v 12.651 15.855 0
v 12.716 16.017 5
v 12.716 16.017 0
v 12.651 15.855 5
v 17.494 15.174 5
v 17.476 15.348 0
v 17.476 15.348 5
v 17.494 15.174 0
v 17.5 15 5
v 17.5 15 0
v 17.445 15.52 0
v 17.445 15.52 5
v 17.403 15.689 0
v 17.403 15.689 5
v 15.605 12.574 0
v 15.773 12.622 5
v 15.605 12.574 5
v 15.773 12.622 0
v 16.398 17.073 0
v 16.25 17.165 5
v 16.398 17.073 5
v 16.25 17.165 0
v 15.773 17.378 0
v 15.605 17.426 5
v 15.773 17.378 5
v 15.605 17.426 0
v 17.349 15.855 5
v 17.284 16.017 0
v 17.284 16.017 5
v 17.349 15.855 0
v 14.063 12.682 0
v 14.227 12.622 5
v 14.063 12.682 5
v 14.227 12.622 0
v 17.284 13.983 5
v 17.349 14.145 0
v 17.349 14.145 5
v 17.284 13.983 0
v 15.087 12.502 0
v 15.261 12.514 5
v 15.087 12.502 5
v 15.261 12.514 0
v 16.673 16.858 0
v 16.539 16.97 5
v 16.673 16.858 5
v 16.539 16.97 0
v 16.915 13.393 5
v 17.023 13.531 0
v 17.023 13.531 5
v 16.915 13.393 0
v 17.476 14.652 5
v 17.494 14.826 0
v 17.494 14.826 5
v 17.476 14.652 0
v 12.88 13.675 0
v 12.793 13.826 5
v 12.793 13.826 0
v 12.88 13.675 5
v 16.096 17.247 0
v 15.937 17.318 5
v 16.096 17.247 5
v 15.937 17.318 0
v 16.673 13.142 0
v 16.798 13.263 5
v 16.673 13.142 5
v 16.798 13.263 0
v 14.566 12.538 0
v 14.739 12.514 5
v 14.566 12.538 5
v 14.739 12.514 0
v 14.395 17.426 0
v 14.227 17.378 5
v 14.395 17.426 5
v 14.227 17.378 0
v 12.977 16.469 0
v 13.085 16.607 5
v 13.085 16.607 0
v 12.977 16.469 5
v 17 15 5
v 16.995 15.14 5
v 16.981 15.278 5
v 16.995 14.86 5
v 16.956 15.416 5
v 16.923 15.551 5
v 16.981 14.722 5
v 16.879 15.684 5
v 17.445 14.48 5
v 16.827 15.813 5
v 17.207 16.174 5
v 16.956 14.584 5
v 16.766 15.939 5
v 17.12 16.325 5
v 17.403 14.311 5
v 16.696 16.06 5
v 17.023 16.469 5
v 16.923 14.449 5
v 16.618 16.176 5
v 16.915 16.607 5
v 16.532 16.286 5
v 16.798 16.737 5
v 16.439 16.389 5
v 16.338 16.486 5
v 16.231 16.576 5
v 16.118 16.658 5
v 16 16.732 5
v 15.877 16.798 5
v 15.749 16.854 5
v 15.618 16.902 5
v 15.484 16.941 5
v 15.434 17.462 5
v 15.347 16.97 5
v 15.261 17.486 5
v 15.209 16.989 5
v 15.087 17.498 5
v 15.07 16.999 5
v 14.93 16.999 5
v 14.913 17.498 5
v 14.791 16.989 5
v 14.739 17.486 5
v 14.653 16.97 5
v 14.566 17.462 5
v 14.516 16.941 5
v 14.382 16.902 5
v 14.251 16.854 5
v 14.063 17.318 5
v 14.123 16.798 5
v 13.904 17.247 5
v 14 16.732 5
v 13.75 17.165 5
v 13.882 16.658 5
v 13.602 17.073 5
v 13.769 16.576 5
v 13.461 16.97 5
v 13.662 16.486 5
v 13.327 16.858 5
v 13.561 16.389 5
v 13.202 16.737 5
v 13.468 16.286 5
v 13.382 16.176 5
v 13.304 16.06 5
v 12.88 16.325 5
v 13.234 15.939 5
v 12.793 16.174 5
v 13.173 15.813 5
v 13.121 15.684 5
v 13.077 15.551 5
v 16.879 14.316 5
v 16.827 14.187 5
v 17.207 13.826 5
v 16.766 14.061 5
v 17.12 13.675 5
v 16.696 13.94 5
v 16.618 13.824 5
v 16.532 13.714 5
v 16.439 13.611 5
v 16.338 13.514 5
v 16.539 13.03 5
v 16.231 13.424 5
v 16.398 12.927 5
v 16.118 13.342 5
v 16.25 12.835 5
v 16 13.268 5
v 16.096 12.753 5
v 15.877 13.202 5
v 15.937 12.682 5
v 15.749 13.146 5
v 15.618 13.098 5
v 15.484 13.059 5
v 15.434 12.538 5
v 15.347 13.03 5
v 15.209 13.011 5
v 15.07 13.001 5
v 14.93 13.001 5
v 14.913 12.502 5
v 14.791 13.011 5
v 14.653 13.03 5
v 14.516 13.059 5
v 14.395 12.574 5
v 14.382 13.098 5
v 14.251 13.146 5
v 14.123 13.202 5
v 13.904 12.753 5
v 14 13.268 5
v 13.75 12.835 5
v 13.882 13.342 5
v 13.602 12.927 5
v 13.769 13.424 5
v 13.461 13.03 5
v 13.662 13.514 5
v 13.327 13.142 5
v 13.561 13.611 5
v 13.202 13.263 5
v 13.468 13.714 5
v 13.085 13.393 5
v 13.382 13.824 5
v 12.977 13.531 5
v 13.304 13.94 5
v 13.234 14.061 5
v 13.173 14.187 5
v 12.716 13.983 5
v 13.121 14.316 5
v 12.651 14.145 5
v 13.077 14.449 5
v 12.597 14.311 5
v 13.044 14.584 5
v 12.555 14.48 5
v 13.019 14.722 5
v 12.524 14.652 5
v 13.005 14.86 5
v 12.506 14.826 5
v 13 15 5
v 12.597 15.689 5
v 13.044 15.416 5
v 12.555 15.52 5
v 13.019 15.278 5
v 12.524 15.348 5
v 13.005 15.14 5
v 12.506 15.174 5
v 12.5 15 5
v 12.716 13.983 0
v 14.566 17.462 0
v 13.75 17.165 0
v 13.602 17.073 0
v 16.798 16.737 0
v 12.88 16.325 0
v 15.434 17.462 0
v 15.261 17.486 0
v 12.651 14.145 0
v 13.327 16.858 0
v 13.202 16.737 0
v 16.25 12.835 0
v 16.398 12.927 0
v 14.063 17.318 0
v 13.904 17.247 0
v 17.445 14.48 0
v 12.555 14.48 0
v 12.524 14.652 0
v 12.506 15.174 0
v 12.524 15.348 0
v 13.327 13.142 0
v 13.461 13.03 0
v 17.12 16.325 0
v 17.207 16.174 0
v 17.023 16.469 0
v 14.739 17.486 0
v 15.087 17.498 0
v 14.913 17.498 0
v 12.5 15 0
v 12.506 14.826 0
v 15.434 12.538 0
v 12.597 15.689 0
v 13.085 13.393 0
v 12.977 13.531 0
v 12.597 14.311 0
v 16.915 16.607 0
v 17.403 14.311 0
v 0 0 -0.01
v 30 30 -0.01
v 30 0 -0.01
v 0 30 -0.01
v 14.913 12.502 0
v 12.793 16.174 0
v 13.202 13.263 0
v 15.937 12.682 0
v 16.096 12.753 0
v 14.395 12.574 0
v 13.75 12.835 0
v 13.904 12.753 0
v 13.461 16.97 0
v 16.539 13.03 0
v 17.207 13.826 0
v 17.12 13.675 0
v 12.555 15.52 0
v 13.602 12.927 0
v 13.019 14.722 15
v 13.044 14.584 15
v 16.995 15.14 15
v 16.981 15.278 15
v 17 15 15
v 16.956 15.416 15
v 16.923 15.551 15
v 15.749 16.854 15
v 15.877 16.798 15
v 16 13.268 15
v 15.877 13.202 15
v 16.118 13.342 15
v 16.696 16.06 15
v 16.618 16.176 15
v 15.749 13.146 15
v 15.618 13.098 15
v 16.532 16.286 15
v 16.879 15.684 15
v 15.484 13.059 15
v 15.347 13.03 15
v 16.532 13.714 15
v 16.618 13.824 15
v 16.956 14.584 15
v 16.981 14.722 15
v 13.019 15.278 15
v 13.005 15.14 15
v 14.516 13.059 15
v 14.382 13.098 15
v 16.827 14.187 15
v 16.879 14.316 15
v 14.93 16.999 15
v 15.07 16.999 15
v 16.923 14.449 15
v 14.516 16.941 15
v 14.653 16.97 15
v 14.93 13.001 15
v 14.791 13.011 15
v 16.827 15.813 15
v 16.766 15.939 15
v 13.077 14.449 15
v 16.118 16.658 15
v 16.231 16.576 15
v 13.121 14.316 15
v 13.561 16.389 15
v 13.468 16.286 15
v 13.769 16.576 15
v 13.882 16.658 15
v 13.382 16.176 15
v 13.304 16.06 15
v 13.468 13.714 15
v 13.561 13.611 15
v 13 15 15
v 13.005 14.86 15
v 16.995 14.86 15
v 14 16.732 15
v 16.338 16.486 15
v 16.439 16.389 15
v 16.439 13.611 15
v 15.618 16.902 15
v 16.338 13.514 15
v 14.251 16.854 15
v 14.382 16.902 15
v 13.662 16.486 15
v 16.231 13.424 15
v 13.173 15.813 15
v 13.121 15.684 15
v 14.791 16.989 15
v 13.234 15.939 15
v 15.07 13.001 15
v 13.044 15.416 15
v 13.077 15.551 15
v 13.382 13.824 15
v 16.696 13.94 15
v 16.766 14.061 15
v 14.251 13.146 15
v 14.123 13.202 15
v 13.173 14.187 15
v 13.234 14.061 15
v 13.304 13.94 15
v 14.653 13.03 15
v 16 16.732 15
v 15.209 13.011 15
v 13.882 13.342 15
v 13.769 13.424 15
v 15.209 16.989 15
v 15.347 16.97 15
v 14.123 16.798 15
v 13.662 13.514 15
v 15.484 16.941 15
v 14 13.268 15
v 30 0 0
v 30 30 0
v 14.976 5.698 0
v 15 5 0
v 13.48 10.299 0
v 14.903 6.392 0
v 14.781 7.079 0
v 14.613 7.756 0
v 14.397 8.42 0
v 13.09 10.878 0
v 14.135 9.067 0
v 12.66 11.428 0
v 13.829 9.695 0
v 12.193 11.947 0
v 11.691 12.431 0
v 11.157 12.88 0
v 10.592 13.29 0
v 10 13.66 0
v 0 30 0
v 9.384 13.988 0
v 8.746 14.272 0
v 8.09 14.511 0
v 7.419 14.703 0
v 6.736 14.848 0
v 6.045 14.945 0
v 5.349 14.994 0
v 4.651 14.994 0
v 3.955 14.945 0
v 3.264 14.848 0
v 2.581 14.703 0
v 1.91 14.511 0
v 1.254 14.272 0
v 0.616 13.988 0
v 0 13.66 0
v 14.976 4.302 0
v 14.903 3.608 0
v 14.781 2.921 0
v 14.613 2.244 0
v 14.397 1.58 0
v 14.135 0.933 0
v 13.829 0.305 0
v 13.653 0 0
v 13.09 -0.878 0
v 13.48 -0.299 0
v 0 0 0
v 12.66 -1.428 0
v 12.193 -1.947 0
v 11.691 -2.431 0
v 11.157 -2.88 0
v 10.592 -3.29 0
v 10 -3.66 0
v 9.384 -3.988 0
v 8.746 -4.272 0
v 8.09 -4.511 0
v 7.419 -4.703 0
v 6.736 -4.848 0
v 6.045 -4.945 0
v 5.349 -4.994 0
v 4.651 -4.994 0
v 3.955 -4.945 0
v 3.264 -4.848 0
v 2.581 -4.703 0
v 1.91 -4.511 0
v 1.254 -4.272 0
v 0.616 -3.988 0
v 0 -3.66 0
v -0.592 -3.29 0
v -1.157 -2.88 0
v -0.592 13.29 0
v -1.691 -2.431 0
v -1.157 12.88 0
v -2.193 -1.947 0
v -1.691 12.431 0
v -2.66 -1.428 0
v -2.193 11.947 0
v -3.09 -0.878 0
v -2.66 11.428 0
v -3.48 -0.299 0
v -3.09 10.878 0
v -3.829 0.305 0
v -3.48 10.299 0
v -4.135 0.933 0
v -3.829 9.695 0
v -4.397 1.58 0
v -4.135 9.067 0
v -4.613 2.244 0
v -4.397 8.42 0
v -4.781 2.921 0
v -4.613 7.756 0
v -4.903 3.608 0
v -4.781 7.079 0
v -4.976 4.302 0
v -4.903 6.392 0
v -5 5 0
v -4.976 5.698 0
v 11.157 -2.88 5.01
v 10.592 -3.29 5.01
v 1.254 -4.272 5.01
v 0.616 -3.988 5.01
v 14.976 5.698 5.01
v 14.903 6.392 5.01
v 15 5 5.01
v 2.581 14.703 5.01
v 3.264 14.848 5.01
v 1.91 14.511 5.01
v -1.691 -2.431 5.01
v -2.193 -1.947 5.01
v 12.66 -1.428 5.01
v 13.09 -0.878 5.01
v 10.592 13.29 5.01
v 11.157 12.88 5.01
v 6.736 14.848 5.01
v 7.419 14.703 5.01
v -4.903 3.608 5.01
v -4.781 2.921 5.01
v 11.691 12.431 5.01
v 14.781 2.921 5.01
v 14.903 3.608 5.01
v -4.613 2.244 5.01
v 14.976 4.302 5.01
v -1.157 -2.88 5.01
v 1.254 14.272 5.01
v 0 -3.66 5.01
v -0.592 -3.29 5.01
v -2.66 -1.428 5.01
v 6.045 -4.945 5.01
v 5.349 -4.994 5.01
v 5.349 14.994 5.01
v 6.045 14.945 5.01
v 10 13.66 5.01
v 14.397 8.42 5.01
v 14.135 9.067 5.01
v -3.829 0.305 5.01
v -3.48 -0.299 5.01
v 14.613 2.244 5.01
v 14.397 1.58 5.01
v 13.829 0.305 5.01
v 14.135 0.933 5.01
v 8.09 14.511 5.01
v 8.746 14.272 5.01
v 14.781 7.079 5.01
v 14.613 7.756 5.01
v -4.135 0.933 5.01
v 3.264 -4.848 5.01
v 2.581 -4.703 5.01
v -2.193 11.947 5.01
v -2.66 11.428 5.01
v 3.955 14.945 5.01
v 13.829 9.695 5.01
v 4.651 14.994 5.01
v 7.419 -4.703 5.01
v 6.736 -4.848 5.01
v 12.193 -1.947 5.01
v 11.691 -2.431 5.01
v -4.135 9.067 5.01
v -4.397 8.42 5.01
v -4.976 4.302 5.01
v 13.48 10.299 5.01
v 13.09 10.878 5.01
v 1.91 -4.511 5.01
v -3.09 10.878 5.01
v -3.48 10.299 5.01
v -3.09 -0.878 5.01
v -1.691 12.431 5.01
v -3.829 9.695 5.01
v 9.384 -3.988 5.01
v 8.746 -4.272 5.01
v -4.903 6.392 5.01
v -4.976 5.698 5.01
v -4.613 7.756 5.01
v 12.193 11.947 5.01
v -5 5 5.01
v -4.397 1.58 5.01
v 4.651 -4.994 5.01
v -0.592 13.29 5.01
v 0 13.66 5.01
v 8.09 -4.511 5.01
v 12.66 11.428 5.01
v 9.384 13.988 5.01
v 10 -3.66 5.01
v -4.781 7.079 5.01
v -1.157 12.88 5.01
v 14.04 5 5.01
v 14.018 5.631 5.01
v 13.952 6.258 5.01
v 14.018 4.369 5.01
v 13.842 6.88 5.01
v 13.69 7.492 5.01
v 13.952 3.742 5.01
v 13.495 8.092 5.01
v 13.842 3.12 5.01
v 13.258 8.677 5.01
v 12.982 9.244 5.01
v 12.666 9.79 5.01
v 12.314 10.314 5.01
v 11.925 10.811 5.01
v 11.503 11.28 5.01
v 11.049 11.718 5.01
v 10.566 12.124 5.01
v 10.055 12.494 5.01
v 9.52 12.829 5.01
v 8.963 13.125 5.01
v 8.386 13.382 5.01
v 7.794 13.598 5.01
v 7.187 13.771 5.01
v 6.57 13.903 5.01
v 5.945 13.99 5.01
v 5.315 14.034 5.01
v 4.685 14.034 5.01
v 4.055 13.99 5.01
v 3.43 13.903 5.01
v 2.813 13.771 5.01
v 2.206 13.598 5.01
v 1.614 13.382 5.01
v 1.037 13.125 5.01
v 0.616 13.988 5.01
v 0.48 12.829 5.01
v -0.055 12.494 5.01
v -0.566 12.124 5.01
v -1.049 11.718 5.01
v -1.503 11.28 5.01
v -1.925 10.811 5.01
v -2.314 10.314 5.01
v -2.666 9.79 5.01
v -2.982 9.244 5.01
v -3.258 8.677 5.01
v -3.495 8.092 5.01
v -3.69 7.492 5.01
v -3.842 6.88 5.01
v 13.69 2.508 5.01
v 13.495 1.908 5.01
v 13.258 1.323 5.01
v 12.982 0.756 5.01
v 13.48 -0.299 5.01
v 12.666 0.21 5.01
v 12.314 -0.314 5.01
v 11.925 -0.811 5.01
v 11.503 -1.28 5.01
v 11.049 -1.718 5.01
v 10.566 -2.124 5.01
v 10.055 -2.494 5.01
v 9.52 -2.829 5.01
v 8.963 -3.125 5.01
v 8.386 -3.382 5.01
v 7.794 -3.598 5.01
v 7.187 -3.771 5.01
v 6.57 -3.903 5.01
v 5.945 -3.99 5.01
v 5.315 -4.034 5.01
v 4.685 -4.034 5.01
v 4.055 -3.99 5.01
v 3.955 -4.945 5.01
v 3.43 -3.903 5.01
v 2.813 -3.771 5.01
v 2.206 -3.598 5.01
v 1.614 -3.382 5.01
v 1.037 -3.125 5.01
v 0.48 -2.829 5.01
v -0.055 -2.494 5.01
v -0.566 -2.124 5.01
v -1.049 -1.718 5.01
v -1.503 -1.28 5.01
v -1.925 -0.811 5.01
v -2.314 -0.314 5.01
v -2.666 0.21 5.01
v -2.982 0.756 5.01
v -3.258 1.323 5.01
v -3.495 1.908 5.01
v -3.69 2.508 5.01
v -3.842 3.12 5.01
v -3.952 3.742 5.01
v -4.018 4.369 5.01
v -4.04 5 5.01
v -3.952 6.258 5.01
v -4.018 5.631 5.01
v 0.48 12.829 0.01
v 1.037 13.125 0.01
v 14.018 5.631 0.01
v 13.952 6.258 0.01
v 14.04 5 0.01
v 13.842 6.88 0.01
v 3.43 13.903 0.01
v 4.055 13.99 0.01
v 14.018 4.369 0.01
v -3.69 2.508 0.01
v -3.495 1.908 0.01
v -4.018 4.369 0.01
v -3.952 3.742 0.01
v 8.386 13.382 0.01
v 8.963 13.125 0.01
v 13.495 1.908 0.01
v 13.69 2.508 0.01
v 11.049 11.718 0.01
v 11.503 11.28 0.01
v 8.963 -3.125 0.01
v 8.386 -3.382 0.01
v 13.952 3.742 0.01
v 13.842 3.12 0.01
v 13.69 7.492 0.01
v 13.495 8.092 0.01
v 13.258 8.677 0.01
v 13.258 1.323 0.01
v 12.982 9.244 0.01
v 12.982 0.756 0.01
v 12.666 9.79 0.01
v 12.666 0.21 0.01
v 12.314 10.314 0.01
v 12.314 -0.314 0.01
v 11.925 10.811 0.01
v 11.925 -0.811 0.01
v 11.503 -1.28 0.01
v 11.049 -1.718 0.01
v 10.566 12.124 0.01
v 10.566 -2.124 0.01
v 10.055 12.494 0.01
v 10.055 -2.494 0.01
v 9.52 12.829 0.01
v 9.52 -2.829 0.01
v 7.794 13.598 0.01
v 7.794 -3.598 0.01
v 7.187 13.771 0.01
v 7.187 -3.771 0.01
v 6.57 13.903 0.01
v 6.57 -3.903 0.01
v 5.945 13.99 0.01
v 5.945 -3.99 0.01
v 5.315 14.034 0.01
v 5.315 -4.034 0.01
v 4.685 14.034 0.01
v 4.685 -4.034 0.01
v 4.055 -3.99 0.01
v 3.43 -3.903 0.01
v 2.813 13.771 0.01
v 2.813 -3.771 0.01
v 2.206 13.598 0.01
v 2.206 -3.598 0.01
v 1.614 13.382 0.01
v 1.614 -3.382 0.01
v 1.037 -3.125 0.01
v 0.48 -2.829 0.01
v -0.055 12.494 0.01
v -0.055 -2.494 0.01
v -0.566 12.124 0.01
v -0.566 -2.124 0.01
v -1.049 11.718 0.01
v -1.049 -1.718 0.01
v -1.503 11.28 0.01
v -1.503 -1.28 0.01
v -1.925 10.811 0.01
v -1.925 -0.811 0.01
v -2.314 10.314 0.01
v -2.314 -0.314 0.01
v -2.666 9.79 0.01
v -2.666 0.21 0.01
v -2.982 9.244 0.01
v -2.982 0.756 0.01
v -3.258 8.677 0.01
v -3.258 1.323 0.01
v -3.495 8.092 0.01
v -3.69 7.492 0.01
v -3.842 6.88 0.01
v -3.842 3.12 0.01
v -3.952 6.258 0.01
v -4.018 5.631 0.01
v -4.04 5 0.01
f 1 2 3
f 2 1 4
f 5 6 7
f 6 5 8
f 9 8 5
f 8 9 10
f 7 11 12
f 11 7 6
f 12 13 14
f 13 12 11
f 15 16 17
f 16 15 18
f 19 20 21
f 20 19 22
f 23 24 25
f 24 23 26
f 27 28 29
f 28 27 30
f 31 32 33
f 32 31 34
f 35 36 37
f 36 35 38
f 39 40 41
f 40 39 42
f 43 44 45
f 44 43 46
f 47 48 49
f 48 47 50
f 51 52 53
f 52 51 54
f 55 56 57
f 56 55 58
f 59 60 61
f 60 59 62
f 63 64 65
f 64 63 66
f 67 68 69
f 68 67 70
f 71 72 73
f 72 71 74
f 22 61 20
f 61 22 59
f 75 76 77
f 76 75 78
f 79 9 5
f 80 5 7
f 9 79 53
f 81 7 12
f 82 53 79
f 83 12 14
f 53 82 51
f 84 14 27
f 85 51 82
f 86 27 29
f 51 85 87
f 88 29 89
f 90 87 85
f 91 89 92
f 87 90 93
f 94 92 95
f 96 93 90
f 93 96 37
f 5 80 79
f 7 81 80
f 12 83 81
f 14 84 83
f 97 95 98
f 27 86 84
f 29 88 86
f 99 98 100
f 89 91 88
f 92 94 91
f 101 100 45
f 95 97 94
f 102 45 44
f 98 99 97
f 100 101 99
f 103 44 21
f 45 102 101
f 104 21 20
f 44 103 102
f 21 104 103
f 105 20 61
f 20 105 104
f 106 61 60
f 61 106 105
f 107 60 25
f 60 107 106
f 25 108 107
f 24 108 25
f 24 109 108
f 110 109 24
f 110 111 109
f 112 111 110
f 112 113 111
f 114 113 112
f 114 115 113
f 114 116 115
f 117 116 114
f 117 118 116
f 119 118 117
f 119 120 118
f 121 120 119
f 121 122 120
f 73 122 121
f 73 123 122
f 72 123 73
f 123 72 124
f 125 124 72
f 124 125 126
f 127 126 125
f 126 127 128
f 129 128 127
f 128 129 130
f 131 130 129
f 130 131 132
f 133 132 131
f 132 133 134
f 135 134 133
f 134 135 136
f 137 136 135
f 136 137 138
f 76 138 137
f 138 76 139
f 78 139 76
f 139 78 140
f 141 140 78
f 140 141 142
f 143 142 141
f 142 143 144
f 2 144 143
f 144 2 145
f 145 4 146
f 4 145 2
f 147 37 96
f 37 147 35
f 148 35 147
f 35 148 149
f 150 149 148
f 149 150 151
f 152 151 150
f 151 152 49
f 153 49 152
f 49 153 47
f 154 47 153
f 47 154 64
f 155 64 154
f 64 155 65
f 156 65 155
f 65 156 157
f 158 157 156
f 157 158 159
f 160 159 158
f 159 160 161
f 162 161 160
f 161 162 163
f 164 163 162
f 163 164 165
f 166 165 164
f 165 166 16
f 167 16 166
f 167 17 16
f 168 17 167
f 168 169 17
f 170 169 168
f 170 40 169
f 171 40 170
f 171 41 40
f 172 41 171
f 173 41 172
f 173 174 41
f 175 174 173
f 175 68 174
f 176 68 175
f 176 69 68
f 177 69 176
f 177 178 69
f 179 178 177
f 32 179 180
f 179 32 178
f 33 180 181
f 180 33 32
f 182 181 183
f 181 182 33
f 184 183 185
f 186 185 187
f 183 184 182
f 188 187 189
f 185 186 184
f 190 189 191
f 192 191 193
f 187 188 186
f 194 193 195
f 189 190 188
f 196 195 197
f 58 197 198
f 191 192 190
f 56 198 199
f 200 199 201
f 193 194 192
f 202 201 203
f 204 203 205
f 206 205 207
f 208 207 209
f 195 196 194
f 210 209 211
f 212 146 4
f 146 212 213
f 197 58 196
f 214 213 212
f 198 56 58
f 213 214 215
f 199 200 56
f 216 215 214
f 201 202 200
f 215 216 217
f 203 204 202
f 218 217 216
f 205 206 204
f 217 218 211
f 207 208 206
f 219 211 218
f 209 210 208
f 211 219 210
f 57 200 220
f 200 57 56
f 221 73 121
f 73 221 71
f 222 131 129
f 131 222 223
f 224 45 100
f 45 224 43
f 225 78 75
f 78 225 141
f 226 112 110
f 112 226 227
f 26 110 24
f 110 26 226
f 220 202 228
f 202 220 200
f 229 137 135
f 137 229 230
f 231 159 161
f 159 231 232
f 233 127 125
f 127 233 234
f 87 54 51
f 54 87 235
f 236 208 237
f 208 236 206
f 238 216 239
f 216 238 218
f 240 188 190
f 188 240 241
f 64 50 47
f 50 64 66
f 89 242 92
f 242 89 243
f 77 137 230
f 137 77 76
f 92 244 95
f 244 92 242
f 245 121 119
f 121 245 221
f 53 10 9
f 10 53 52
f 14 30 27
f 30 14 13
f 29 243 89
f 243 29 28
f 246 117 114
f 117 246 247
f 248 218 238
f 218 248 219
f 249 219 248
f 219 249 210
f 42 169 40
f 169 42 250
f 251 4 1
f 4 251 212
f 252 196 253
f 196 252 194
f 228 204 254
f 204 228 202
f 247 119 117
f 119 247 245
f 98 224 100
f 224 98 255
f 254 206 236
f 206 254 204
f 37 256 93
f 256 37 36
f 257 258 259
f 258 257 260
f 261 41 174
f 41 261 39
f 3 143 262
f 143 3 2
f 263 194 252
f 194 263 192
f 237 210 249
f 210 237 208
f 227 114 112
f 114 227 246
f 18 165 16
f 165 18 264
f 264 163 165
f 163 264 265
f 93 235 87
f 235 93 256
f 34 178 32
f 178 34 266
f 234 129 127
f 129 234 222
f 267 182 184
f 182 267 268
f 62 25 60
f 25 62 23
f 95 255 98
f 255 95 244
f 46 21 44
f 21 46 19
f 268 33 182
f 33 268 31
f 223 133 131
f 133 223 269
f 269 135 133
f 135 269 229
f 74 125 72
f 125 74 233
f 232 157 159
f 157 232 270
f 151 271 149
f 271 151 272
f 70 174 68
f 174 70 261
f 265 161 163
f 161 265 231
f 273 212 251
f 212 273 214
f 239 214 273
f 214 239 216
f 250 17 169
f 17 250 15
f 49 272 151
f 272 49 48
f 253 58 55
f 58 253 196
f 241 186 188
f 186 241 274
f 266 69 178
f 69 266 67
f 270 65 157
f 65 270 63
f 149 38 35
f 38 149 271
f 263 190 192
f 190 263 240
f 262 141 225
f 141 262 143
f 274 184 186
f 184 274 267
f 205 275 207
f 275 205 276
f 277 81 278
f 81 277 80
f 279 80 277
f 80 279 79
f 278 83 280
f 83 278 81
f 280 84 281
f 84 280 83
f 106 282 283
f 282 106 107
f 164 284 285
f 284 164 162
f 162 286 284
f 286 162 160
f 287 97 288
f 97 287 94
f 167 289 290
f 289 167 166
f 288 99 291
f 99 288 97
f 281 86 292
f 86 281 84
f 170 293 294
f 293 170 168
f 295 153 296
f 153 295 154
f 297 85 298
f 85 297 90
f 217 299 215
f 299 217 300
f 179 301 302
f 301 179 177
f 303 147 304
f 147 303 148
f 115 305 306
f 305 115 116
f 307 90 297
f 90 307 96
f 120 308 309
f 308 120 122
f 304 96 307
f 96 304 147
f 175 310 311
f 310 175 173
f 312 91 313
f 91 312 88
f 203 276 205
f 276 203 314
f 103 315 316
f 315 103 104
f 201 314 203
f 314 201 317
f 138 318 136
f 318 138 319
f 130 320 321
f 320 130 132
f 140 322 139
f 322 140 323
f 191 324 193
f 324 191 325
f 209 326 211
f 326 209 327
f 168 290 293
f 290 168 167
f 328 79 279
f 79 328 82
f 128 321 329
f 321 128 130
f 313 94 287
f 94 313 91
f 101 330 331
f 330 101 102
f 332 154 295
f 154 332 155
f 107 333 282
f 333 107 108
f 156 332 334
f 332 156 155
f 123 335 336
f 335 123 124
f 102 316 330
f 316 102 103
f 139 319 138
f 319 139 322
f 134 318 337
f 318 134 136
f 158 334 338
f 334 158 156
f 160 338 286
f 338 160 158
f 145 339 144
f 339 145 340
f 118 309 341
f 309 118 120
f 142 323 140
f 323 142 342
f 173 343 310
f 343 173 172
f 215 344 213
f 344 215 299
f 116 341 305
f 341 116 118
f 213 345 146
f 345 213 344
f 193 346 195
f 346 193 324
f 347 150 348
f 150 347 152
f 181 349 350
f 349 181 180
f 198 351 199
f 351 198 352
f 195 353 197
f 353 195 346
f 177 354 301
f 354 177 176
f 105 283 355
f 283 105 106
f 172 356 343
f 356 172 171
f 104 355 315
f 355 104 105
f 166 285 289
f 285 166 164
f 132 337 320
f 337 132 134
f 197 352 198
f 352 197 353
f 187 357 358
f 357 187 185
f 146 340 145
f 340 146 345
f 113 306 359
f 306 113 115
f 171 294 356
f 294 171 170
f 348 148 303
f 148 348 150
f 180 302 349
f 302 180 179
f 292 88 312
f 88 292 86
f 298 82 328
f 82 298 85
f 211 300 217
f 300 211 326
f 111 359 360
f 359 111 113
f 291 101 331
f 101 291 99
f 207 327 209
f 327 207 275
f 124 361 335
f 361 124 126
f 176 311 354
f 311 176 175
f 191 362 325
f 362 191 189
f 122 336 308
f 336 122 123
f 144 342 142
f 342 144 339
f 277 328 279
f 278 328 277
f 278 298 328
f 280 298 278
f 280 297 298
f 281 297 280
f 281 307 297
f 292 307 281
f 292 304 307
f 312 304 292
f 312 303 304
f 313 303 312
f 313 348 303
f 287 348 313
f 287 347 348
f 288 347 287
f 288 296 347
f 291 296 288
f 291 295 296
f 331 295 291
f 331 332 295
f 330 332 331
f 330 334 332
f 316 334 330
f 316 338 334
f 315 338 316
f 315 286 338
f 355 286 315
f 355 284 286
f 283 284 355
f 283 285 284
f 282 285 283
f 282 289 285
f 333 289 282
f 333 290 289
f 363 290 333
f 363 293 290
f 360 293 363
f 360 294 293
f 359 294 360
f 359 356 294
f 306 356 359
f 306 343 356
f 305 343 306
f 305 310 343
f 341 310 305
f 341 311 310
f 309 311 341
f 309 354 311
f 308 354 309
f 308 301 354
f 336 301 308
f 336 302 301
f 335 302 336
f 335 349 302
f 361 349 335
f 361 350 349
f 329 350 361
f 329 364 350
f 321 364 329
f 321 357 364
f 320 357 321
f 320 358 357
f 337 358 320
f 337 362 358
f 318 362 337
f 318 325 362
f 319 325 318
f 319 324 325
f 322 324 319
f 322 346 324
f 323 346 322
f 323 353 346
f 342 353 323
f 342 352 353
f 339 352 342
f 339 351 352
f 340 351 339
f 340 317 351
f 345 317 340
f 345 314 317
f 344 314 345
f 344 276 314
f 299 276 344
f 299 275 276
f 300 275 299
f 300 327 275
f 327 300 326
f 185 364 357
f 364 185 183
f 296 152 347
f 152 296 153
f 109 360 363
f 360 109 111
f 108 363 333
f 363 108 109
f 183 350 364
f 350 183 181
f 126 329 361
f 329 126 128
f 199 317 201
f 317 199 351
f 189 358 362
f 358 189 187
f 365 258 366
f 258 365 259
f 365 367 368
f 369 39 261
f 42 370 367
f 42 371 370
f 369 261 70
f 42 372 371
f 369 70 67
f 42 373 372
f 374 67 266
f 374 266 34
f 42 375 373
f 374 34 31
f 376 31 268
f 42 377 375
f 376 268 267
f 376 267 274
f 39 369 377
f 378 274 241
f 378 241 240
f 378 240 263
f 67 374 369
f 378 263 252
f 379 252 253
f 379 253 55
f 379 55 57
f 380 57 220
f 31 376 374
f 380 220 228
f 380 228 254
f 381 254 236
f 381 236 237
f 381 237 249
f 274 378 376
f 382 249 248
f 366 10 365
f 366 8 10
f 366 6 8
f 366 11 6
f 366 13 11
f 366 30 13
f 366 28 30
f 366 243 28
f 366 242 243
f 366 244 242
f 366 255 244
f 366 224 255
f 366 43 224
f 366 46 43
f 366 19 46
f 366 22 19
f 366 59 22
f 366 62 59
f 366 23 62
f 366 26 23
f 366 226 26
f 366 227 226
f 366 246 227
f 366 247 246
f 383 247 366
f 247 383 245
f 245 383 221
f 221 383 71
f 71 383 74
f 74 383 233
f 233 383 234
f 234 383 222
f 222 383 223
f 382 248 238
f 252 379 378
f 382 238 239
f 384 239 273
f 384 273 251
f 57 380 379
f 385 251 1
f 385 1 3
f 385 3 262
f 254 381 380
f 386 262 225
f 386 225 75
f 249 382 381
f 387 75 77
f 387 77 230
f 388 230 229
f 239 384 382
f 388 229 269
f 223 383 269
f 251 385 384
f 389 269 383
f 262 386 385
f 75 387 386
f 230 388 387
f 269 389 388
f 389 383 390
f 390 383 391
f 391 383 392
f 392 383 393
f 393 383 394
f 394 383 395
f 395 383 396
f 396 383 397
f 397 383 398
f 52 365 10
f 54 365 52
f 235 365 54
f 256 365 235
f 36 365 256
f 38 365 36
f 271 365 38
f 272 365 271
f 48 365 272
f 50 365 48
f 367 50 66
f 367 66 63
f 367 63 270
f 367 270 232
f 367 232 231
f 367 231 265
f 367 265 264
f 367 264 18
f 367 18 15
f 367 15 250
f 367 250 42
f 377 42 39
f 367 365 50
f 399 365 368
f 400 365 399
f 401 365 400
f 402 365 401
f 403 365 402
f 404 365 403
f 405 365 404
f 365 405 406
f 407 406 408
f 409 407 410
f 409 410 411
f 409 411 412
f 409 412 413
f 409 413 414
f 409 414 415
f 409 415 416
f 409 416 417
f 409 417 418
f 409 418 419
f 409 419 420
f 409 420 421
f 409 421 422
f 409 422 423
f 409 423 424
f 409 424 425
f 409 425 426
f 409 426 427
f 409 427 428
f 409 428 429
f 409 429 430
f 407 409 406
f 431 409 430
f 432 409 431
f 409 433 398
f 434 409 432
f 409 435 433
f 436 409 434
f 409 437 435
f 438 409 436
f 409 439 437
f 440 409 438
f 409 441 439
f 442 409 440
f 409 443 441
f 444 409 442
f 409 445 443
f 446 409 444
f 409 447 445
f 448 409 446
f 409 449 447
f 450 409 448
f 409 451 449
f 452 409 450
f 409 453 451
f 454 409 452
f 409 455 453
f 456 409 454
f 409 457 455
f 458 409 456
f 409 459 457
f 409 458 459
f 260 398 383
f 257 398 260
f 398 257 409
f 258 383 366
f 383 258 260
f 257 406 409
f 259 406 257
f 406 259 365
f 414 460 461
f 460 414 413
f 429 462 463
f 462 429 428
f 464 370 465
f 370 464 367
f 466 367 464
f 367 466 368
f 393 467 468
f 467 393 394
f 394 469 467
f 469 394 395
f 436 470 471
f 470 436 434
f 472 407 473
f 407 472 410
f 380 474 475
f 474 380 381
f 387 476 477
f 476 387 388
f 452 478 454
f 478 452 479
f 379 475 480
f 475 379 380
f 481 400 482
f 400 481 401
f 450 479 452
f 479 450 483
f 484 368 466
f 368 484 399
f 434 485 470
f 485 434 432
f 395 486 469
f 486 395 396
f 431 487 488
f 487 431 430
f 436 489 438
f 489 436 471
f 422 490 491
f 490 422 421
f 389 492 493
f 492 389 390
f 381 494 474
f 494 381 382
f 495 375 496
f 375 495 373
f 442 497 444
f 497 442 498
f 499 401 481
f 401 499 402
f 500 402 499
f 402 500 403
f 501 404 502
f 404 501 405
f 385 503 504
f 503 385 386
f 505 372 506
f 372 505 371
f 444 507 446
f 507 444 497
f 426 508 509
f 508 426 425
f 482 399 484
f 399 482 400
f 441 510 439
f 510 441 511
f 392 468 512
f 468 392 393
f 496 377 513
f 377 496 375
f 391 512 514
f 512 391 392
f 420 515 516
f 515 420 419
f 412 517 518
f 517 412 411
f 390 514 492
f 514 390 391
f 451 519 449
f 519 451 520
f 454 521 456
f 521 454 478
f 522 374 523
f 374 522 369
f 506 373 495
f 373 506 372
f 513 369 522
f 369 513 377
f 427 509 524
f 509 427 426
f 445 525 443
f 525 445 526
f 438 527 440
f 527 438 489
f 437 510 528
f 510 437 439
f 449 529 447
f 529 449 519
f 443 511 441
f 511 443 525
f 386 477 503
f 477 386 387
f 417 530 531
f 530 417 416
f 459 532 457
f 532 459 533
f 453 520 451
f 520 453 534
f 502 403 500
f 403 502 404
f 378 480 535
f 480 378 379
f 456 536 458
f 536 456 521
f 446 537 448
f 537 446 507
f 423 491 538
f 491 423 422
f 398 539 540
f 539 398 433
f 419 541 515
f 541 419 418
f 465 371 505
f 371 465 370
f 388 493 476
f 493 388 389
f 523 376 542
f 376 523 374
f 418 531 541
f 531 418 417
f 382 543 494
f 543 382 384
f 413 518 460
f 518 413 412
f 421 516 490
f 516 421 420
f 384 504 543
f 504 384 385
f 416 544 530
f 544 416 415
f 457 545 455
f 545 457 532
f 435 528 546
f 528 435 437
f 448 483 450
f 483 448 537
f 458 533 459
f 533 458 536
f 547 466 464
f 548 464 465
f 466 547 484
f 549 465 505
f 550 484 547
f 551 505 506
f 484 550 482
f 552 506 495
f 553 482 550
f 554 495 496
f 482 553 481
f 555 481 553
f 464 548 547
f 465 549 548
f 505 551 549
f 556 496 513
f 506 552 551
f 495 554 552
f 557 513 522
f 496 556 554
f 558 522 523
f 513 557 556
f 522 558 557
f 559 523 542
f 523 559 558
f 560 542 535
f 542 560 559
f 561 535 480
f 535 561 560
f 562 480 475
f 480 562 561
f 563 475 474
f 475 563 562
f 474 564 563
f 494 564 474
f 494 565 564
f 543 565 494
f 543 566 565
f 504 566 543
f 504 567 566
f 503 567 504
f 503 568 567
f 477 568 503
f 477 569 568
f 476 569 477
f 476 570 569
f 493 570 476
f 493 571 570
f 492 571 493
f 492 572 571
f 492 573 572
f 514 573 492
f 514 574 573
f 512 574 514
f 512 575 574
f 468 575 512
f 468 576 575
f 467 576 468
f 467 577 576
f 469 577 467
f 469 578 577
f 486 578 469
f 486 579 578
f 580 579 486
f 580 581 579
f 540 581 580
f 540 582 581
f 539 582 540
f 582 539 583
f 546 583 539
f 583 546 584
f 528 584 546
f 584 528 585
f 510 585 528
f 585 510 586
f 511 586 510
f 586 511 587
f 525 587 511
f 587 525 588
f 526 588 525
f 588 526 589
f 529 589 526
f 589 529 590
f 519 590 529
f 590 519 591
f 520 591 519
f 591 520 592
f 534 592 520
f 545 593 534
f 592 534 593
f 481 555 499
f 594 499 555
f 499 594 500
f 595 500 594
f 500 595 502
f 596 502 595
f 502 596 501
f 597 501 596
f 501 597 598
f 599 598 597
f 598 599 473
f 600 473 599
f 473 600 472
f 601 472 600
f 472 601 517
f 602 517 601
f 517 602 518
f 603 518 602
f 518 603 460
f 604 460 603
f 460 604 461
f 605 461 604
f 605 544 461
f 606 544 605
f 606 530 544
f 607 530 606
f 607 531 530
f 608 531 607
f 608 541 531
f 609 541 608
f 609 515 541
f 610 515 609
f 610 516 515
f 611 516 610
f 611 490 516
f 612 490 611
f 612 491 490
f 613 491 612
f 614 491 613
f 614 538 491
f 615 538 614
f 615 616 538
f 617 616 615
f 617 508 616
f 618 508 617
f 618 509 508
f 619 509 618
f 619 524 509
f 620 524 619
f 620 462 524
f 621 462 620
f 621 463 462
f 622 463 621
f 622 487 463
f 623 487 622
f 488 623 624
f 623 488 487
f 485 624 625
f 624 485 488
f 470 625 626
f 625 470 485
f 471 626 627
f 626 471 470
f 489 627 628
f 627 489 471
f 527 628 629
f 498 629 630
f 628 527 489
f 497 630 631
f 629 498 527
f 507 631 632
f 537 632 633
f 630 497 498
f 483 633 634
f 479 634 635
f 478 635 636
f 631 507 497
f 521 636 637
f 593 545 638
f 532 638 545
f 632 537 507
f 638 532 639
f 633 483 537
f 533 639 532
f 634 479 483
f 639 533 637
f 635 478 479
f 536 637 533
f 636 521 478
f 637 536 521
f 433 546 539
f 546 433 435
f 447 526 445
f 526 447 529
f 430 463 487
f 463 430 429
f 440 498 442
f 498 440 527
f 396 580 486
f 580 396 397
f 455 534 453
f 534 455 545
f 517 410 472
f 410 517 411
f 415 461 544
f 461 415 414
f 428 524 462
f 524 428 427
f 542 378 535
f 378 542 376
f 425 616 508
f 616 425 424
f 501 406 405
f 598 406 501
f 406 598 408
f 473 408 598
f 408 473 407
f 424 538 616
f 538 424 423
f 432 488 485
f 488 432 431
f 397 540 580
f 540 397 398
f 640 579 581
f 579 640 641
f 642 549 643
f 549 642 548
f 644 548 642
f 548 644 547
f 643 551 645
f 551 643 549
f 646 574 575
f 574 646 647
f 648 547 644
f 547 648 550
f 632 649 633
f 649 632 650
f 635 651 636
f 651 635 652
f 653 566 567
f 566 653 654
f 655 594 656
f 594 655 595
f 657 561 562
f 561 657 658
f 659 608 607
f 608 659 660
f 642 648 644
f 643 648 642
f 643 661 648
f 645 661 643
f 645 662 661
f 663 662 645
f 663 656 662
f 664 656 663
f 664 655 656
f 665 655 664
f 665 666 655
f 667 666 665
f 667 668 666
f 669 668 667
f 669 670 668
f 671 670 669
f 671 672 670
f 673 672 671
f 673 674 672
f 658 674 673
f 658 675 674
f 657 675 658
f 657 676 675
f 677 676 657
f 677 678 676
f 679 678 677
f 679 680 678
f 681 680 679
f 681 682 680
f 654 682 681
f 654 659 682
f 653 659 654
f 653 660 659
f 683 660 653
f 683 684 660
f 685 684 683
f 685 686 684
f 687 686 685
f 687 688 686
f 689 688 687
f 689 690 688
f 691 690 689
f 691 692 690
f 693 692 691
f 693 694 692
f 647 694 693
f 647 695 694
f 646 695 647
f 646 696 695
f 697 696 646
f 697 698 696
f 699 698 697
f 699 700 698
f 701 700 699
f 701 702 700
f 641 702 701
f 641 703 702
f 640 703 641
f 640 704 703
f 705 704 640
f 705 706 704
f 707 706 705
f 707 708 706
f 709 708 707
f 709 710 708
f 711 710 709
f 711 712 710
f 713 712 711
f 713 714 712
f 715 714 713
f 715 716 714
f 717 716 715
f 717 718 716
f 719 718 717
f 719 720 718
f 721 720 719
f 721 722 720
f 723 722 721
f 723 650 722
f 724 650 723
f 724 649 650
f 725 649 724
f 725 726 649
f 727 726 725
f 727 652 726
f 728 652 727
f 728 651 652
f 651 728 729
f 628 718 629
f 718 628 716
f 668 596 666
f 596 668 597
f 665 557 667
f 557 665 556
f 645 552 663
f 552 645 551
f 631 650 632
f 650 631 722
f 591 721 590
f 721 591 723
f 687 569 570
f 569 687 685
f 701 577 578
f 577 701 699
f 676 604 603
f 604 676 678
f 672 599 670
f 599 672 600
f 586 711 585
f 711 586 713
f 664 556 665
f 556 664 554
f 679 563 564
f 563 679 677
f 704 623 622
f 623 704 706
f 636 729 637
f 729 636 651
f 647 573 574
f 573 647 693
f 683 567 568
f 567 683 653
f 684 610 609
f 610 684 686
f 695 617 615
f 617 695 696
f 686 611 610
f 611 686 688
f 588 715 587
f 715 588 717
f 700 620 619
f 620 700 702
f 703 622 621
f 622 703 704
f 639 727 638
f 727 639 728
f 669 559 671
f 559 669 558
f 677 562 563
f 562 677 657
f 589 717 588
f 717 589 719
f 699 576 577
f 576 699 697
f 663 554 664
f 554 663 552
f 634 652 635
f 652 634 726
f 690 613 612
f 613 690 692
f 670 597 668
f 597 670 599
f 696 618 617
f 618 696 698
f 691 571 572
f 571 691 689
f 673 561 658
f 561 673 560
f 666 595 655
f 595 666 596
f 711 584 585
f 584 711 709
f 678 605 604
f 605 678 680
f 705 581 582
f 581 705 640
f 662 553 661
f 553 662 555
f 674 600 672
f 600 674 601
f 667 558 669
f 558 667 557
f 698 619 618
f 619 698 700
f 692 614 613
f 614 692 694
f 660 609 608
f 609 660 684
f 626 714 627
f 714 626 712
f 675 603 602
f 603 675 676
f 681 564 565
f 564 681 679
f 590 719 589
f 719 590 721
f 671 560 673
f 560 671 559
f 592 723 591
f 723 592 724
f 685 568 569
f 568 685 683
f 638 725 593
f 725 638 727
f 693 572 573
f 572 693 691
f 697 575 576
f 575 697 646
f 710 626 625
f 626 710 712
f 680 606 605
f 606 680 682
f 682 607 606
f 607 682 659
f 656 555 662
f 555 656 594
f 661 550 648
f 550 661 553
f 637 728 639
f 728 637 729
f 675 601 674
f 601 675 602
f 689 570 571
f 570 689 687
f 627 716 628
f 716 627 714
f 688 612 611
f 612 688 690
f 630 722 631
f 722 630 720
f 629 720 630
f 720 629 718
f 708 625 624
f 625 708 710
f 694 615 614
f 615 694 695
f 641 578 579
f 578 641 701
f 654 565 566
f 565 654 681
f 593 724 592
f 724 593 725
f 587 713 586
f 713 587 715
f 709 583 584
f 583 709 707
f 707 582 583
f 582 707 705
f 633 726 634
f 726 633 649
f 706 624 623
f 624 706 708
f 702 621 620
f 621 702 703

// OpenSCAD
// file: ../Base/PlacementOptions.scad
// Fischertechnik Box Foundation
// Placement Options

// Alignment
NoAlign = 0;
AlignLeft = 1;
AlignBottom = 2;
AlignCenter = 3;
AlignRight = 4;
AlignTop = 5;

// Element rotation degree steps
rotations = [0, -90, -180, -270];

// Rotation
NoRotation = 0;
Rotate0 = 0;
Rotate90 = 1;
Rotate180 = 2;
Rotate270 = 3;

// Docking (seen from above)
NoDock = -1;
DockLeft = 0;
DockTop = 1;
DockRight = 2;
DockCorner = 2;
DockBottom = 3;

// Web corners
LowerLeft = 0;
UpperLeft = 1;
UpperRight = 2;
LowerRight = 3;

// Web position relative to corner
LeftOfCorner = 0;
RightOfCorner = 1;
// file: ../Base/Boxes.scad
// Fischertechnik Box Foundation
// Pre-designed Boxes

use <Constants.scad>

include <PlacementOptions.scad>

box190Width = 190;
box190Depth = 130;
box130Width = 130;
box130Depth = 95;
boxUsageHeight = 33.9;
boxWallThickness = 2.4;
boxBaseThickness = 1.0;

// getBoxWallThickness()
// Gets the wall thickness of a Fischertechnik Box

function getBoxWallThickness() = boxWallThickness;

// Gets the usable height of a fischertechnik box
function getBoxUsageHeight() = boxUsageHeight;

// Gets the thickness of the Fischertechnik box base.
function getBoxBaseThickness() = boxBaseThickness;

// Gets the usable inner space of a Box 190 as an x/y-list
function getBox190Space() = [
    box190Width - 2*getBoxWallThickness(), 
    box190Depth - 2*getBoxWallThickness() ];

// Imports the Fischertechnik empty box 130x190 mm and places it at position 0,0
// 190x130 are the outer sizes, the inner space is slightly smaller. Use getBox190Space() to get the inner sizes.
// This module needs the STL file "Fischertechnik Box 130x190.stl" in the library path.
// The box is positioned that the usable inner space is at the 0,0,0 position. The

module Box190() {
    translate([-getBoxWallThickness(),-getBoxWallThickness(),-getBoxBaseThickness()])
        import("Fischertechnik Box 130x190.stl", convexity=3);
}

// Gets the usable inner space of a Box 130 as an x/y-list
function getBox130Space() = [
    box130Width - 2*getBoxWallThickness(), 
    box130Depth - 2*getBoxWallThickness() ];

// Imports the Fischertechnik empty box 95x130 mm and places it at position 0,0
// 190x130 are the outer sizes, the inner space is slightly smaller. Use getBox190Space() to get the inner sizes.
// This module needs the STL file "Fischertechnik Box 95x130.stl" in the library path.
// The box is positioned that the usable inner space is at the 0,0,0 position. The

module Box130() {
    translate([-getBoxWallThickness(),-getBoxWallThickness(),-getBoxBaseThickness()])
        import("Fischertechnik Box 95x130.stl", convexity=3);
}

// Creates a web at the specified box walls
// corner 0 = LowerLeft, 1 = UpperLeft, 2 = UpperRight, 3 = LowerRight
// side 0 = LeftOfCorner, 1 = RightOfCorner
// distance = Distance in mm from the corner
// box = inner width and depth of the box (default: Box 190)
// webWidth = length of the web (default is 3 mms)
// webThickness = thickness of the web (default is 1 mm)

module BoxWeb(corner, side, distance, box=getBox190Space(), webWidth=3, webThickness=1.0) {
    sink = getBoxWallThickness()/2;

    width = (corner % 2 == 0) ? 
            (side == LeftOfCorner ? webWidth : webThickness) :
            (side == LeftOfCorner ? webThickness : webWidth);

    depth = (corner % 2 == 0) ? 
            (side == RightOfCorner ? webWidth : webThickness) :
            (side == RightOfCorner ? webThickness : webWidth);
    
    xDiff = corner == LowerLeft ? 
                (side == LeftOfCorner ? -sink : distance) :
            (corner == UpperLeft ?                
                (side == LeftOfCorner ? distance : -sink) :
            (corner == UpperRight ?
                (side == LeftOfCorner ? box.x-webWidth+sink : box.x-distance-webThickness) :
                (side == LeftOfCorner ? box.x-distance-webThickness: box.x-webWidth+sink)));

    yDiff = corner == LowerLeft ? 
                (side == RightOfCorner ? -sink : distance) :
            (corner == UpperLeft ?
                (side == RightOfCorner ? box.y-distance : box.y-webWidth+sink) :
            (corner == UpperRight ?
                (side == RightOfCorner ? box.y-webWidth+sink : box.y-distance) :
                (side == RightOfCorner ? distance : -sink)));
    
    translate([xDiff, yDiff, -getExcess()])
        cube([width, depth, boxUsageHeight + 2*getExcess()]);
}
// file: ../Base/Rotation.scad
// Fischertechnik Box Foundation
// Geometry Helpers Rotation

include <PlacementOptions.scad>

// getRotatedSpace(space, rotation=NoRotation)
// Rotates the space dependent on the specified rotation

function getRotatedSpace(space, rotation=NoRotation) = [
    (rotation == Rotate90 || rotation == Rotate270) ? space.y : space.x,
    (rotation == Rotate90 || rotation == Rotate270) ? space.x : space.y
];

// Rotates the given space around the fixed left lower corner
// space = the space the children needs as width/depth list [width,depth]
// rotation = 0 Rotate0 degrees, 1 Rotate90 degrees, 2 Rotate180 degrees, 3 Rotate270 degrees (equivalent to -90)

module RotateFix(space, rotation=Rotate0) {
    dy = (rotation == Rotate0 || rotation == Rotate270) ? 0 :
        (rotation == Rotate90) ? space.x :
        space.y;
    dx = (rotation < Rotate180) ? 0 :
        (rotation == Rotate180) ? space.x :
        space.y;
    
    translate([dx, dy, 0])
        rotate([0, 0, rotations[rotation]])
            children();
}
// file: ../Base/Alignment.scad
// Fischertechnik Box Foundation
// Geometry Helpers Alignment

include <PlacementOptions.scad>

// getAlignedX(elementWidth, spaceWidth, align=AlignRight, offset=0)
// Gets the aligned X offset of an element with the given
// width in the given space.
// elementWidth = The width of the element to positon
// spaceWidth = The space where the element should be aligned
// align = 0 AlignLeft, 1 AlignCenter, 2 AlignRight
// offset = an optional offset from the aligned position. When
// aligned left or centered, then positive values are in X direction.
// When aligned right then positive values are in negative X direction.

function getAlignedX(elementWidth, spaceWidth, align=AlignRight, offset=0) =
    (align == AlignLeft) ?
        offset :
        ((align == AlignCenter) ?
        (spaceWidth - elementWidth)/2 + offset :
        spaceWidth - offset - elementWidth);

// getAlignedY(elementDepth, spaceDepth, align=AlignTop, offset=0)
// Gets the aligned Y offset of an element with the given
// depth in the given space.
// elementDepth = The depth of the element to positon
// spaceDepth = The space where the element should be aligned
// align = 0 AlignBottom, 1 AlignCenter, 2 AlignTop
// offset = an optional offset from the aligned position. When
// aligned bottom or centered, then positive values are in Y direction.
// When aligned top then positive values are in negative Y direction.

function getAlignedY(elementDepth, spaceDepth, align=AlignTop, offset=0) =
    (align == AlignBottom) ?
        offset :
        ((align == AlignCenter) ?
        (spaceDepth - elementDepth)/2 + offset :
        spaceDepth - offset - elementDepth);
// file: ../Base/Placement.scad
// Fischertechnik Box Foundation
// Geometry Helpers Placement

use <Constants.scad>
use <Alignment.scad>
use <Rotation.scad>
use <Boxes.scad>

include <PlacementOptions.scad>

// Place(x=0, y=0, elementSpace=[0,0], alignX=AlignLeft, alignY=AlignBottom, rotation=Rotate0, boxSpace=getBox190Space())
// Places the child at the specified position
// y = Y-Position. This is a relative position when an X aligment is specified.
// x = X-Position. This is a relative position when an Y aligment is specified.
// elementSpace = space of the element to be placed [x,y]
// alignX = -1=NoAlign, 0 AlignLeft, 1 AlignCenter, 3 AlignRight (elementSpace and boxSpace required!)
// alignY = -1=NoAlign, 2 AlignBottom, 1 AlignCenter, 4 AlignTop (elementSpace and boxSpace required!)
// rotation = 0 Rotate0 0 degrees, 1 Rotate90 90 degrees, 
// 2 Rotate180 180 degrees, 3 Rotate270 270 degrees (equivalent to -90)
// boxSpace = Inner space of the box where the placement occurs [x,y] - default is Box 190x130 inner space

module Place(x=0, y=0, elementSpace=[0,0], 
  alignX=AlignLeft, alignY=AlignBottom, 
  rotation=NoRotation, boxSpace=getBox190Space()) {

    module Position(x, y, space, rotation=Rotate0) {
        translate([x, y, 0])
            RotateFix(space, rotation)
                children(0);
    }

    space = getRotatedSpace(elementSpace, rotation);
    alignedX = getAlignedX(space.x, boxSpace.x, alignX, x);
    alignedY = getAlignedY(space.y, boxSpace.y, alignY, y);
    Position(alignedX, alignedY, elementSpace, rotation)
        children(0);
}

// Center(space=getBox130Space(), elementSpace=[0,0])
// space = Space where the children is centered. For cylinder use centered=true and no elementSpace.
// elementSpace = space of the element to be centered [x,y]

module Center(space=getBox190Space(), elementSpace=[0,0]) {
    translate([(space.x - elementSpace.x) / 2, (space.y - elementSpace.y) / 2])
        children(0);
}

// CenterHorizontal(width=0, y=0, offset=0, space=getBox130Space())
// space = Space where the children is centered. For cylinder use centered=true and no elementSpace.
// elementSpace = space of the element to be centered [x,y]

module CenterHorizontal(width=0, y=0, offset=0, space=getBox190Space()) {
    translate([(space.x - width) / 2 + offset, y])
        children(0);
}

// CenterVertical(depth=0, x=0, offset=0, space=getBox130Space())
// space = Space where the children is centered. For cylinder use centered=true and no elementSpace.
// elementSpace = space of the element to be centered [x,y]

module CenterVerticalal(depth=0, x=0, offset=0, space=getBox190Space()) {
    translate([x, (space.y - depth) / 2 + offset])
        children(0);
}
// file: ../Base/Constants.scad
// Fischertechnik Box Foundation
// Constants

// Constant values necessary for multiple elements

// Base constants
dividerThickness = 1.2;
excess = 0.01;
fragments = 90;
tolerance = 0.8;

// Gets the thickness of a divider 
function getDividerThickness() = dividerThickness;

// Gets the excess that is used to merge walls into each other
function getExcess() = excess;

// Gets amount of fragments of a cylinder
function getFragments() = fragments;

// Gets the inner tolerance of a frame to each side
function getTolerance() = tolerance;


// Fischertechnik specific constants
axisDiameter = 4;
axisBottomDiameter = axisDiameter + 1;
standardEdgeDistance = 2.5;
standardWebDistance = 11.5;
standardCornerLength = 15;
tubeWallFactor = 1.6;

// Gets axis diameter
function getAxisDiameter() = axisDiameter;

// Gets axis bottom diameter for thicker part at the bottom
function getAxisBottomDiameter() = axisBottomDiameter;

// gets the standard distance to the wall of the box for dockable frames with webs
function getStandardEdgeDistance() = standardEdgeDistance;

// gets the standard distance of each web to the corner of the dockable frame
function getStandardWebDistance() = standardWebDistance;

// gets the standard length of the corner walls of a dockable frame
function getStandardCornerLength() = standardCornerLength;

// gets the wall thickness of a tube.
function getTubeWallThickness() = tubeWallFactor * getDividerThickness();
// main file
// Fischertechnik Box Library
// Axis for hub
// 31014

use <../Base/Constants.scad>
use <../Base/Placement.scad>
use <../ModelBase/Simple.scad>

width = 30;
depth = 30;

// getAxisHubSpace()
// Gets the space the axis hub needs as width and depth (.x and .y as a list)

function getAxisHubSpace() = [width, depth];

// AxisHub()
// Axis to stick a standard hub on it. This needs
// a 30x30 mm rectangle in the box. To support the placement
// the axis has a thin and sinked 30x30 mm base plate.

module AxisHub() {
    axisHeight = 15;
    tubeHeight = 5;
    tubeDiameter = 20;

    LeveledAxisWithSpace(axisHeight, tubeHeight, getAxisHubSpace());
    
    Center(getAxisHubSpace(), [tubeDiameter, tubeDiameter])
        Tube(tubeHeight, tubeDiameter);
}

// Tests
color("lightgray") {
AxisHub();
}
